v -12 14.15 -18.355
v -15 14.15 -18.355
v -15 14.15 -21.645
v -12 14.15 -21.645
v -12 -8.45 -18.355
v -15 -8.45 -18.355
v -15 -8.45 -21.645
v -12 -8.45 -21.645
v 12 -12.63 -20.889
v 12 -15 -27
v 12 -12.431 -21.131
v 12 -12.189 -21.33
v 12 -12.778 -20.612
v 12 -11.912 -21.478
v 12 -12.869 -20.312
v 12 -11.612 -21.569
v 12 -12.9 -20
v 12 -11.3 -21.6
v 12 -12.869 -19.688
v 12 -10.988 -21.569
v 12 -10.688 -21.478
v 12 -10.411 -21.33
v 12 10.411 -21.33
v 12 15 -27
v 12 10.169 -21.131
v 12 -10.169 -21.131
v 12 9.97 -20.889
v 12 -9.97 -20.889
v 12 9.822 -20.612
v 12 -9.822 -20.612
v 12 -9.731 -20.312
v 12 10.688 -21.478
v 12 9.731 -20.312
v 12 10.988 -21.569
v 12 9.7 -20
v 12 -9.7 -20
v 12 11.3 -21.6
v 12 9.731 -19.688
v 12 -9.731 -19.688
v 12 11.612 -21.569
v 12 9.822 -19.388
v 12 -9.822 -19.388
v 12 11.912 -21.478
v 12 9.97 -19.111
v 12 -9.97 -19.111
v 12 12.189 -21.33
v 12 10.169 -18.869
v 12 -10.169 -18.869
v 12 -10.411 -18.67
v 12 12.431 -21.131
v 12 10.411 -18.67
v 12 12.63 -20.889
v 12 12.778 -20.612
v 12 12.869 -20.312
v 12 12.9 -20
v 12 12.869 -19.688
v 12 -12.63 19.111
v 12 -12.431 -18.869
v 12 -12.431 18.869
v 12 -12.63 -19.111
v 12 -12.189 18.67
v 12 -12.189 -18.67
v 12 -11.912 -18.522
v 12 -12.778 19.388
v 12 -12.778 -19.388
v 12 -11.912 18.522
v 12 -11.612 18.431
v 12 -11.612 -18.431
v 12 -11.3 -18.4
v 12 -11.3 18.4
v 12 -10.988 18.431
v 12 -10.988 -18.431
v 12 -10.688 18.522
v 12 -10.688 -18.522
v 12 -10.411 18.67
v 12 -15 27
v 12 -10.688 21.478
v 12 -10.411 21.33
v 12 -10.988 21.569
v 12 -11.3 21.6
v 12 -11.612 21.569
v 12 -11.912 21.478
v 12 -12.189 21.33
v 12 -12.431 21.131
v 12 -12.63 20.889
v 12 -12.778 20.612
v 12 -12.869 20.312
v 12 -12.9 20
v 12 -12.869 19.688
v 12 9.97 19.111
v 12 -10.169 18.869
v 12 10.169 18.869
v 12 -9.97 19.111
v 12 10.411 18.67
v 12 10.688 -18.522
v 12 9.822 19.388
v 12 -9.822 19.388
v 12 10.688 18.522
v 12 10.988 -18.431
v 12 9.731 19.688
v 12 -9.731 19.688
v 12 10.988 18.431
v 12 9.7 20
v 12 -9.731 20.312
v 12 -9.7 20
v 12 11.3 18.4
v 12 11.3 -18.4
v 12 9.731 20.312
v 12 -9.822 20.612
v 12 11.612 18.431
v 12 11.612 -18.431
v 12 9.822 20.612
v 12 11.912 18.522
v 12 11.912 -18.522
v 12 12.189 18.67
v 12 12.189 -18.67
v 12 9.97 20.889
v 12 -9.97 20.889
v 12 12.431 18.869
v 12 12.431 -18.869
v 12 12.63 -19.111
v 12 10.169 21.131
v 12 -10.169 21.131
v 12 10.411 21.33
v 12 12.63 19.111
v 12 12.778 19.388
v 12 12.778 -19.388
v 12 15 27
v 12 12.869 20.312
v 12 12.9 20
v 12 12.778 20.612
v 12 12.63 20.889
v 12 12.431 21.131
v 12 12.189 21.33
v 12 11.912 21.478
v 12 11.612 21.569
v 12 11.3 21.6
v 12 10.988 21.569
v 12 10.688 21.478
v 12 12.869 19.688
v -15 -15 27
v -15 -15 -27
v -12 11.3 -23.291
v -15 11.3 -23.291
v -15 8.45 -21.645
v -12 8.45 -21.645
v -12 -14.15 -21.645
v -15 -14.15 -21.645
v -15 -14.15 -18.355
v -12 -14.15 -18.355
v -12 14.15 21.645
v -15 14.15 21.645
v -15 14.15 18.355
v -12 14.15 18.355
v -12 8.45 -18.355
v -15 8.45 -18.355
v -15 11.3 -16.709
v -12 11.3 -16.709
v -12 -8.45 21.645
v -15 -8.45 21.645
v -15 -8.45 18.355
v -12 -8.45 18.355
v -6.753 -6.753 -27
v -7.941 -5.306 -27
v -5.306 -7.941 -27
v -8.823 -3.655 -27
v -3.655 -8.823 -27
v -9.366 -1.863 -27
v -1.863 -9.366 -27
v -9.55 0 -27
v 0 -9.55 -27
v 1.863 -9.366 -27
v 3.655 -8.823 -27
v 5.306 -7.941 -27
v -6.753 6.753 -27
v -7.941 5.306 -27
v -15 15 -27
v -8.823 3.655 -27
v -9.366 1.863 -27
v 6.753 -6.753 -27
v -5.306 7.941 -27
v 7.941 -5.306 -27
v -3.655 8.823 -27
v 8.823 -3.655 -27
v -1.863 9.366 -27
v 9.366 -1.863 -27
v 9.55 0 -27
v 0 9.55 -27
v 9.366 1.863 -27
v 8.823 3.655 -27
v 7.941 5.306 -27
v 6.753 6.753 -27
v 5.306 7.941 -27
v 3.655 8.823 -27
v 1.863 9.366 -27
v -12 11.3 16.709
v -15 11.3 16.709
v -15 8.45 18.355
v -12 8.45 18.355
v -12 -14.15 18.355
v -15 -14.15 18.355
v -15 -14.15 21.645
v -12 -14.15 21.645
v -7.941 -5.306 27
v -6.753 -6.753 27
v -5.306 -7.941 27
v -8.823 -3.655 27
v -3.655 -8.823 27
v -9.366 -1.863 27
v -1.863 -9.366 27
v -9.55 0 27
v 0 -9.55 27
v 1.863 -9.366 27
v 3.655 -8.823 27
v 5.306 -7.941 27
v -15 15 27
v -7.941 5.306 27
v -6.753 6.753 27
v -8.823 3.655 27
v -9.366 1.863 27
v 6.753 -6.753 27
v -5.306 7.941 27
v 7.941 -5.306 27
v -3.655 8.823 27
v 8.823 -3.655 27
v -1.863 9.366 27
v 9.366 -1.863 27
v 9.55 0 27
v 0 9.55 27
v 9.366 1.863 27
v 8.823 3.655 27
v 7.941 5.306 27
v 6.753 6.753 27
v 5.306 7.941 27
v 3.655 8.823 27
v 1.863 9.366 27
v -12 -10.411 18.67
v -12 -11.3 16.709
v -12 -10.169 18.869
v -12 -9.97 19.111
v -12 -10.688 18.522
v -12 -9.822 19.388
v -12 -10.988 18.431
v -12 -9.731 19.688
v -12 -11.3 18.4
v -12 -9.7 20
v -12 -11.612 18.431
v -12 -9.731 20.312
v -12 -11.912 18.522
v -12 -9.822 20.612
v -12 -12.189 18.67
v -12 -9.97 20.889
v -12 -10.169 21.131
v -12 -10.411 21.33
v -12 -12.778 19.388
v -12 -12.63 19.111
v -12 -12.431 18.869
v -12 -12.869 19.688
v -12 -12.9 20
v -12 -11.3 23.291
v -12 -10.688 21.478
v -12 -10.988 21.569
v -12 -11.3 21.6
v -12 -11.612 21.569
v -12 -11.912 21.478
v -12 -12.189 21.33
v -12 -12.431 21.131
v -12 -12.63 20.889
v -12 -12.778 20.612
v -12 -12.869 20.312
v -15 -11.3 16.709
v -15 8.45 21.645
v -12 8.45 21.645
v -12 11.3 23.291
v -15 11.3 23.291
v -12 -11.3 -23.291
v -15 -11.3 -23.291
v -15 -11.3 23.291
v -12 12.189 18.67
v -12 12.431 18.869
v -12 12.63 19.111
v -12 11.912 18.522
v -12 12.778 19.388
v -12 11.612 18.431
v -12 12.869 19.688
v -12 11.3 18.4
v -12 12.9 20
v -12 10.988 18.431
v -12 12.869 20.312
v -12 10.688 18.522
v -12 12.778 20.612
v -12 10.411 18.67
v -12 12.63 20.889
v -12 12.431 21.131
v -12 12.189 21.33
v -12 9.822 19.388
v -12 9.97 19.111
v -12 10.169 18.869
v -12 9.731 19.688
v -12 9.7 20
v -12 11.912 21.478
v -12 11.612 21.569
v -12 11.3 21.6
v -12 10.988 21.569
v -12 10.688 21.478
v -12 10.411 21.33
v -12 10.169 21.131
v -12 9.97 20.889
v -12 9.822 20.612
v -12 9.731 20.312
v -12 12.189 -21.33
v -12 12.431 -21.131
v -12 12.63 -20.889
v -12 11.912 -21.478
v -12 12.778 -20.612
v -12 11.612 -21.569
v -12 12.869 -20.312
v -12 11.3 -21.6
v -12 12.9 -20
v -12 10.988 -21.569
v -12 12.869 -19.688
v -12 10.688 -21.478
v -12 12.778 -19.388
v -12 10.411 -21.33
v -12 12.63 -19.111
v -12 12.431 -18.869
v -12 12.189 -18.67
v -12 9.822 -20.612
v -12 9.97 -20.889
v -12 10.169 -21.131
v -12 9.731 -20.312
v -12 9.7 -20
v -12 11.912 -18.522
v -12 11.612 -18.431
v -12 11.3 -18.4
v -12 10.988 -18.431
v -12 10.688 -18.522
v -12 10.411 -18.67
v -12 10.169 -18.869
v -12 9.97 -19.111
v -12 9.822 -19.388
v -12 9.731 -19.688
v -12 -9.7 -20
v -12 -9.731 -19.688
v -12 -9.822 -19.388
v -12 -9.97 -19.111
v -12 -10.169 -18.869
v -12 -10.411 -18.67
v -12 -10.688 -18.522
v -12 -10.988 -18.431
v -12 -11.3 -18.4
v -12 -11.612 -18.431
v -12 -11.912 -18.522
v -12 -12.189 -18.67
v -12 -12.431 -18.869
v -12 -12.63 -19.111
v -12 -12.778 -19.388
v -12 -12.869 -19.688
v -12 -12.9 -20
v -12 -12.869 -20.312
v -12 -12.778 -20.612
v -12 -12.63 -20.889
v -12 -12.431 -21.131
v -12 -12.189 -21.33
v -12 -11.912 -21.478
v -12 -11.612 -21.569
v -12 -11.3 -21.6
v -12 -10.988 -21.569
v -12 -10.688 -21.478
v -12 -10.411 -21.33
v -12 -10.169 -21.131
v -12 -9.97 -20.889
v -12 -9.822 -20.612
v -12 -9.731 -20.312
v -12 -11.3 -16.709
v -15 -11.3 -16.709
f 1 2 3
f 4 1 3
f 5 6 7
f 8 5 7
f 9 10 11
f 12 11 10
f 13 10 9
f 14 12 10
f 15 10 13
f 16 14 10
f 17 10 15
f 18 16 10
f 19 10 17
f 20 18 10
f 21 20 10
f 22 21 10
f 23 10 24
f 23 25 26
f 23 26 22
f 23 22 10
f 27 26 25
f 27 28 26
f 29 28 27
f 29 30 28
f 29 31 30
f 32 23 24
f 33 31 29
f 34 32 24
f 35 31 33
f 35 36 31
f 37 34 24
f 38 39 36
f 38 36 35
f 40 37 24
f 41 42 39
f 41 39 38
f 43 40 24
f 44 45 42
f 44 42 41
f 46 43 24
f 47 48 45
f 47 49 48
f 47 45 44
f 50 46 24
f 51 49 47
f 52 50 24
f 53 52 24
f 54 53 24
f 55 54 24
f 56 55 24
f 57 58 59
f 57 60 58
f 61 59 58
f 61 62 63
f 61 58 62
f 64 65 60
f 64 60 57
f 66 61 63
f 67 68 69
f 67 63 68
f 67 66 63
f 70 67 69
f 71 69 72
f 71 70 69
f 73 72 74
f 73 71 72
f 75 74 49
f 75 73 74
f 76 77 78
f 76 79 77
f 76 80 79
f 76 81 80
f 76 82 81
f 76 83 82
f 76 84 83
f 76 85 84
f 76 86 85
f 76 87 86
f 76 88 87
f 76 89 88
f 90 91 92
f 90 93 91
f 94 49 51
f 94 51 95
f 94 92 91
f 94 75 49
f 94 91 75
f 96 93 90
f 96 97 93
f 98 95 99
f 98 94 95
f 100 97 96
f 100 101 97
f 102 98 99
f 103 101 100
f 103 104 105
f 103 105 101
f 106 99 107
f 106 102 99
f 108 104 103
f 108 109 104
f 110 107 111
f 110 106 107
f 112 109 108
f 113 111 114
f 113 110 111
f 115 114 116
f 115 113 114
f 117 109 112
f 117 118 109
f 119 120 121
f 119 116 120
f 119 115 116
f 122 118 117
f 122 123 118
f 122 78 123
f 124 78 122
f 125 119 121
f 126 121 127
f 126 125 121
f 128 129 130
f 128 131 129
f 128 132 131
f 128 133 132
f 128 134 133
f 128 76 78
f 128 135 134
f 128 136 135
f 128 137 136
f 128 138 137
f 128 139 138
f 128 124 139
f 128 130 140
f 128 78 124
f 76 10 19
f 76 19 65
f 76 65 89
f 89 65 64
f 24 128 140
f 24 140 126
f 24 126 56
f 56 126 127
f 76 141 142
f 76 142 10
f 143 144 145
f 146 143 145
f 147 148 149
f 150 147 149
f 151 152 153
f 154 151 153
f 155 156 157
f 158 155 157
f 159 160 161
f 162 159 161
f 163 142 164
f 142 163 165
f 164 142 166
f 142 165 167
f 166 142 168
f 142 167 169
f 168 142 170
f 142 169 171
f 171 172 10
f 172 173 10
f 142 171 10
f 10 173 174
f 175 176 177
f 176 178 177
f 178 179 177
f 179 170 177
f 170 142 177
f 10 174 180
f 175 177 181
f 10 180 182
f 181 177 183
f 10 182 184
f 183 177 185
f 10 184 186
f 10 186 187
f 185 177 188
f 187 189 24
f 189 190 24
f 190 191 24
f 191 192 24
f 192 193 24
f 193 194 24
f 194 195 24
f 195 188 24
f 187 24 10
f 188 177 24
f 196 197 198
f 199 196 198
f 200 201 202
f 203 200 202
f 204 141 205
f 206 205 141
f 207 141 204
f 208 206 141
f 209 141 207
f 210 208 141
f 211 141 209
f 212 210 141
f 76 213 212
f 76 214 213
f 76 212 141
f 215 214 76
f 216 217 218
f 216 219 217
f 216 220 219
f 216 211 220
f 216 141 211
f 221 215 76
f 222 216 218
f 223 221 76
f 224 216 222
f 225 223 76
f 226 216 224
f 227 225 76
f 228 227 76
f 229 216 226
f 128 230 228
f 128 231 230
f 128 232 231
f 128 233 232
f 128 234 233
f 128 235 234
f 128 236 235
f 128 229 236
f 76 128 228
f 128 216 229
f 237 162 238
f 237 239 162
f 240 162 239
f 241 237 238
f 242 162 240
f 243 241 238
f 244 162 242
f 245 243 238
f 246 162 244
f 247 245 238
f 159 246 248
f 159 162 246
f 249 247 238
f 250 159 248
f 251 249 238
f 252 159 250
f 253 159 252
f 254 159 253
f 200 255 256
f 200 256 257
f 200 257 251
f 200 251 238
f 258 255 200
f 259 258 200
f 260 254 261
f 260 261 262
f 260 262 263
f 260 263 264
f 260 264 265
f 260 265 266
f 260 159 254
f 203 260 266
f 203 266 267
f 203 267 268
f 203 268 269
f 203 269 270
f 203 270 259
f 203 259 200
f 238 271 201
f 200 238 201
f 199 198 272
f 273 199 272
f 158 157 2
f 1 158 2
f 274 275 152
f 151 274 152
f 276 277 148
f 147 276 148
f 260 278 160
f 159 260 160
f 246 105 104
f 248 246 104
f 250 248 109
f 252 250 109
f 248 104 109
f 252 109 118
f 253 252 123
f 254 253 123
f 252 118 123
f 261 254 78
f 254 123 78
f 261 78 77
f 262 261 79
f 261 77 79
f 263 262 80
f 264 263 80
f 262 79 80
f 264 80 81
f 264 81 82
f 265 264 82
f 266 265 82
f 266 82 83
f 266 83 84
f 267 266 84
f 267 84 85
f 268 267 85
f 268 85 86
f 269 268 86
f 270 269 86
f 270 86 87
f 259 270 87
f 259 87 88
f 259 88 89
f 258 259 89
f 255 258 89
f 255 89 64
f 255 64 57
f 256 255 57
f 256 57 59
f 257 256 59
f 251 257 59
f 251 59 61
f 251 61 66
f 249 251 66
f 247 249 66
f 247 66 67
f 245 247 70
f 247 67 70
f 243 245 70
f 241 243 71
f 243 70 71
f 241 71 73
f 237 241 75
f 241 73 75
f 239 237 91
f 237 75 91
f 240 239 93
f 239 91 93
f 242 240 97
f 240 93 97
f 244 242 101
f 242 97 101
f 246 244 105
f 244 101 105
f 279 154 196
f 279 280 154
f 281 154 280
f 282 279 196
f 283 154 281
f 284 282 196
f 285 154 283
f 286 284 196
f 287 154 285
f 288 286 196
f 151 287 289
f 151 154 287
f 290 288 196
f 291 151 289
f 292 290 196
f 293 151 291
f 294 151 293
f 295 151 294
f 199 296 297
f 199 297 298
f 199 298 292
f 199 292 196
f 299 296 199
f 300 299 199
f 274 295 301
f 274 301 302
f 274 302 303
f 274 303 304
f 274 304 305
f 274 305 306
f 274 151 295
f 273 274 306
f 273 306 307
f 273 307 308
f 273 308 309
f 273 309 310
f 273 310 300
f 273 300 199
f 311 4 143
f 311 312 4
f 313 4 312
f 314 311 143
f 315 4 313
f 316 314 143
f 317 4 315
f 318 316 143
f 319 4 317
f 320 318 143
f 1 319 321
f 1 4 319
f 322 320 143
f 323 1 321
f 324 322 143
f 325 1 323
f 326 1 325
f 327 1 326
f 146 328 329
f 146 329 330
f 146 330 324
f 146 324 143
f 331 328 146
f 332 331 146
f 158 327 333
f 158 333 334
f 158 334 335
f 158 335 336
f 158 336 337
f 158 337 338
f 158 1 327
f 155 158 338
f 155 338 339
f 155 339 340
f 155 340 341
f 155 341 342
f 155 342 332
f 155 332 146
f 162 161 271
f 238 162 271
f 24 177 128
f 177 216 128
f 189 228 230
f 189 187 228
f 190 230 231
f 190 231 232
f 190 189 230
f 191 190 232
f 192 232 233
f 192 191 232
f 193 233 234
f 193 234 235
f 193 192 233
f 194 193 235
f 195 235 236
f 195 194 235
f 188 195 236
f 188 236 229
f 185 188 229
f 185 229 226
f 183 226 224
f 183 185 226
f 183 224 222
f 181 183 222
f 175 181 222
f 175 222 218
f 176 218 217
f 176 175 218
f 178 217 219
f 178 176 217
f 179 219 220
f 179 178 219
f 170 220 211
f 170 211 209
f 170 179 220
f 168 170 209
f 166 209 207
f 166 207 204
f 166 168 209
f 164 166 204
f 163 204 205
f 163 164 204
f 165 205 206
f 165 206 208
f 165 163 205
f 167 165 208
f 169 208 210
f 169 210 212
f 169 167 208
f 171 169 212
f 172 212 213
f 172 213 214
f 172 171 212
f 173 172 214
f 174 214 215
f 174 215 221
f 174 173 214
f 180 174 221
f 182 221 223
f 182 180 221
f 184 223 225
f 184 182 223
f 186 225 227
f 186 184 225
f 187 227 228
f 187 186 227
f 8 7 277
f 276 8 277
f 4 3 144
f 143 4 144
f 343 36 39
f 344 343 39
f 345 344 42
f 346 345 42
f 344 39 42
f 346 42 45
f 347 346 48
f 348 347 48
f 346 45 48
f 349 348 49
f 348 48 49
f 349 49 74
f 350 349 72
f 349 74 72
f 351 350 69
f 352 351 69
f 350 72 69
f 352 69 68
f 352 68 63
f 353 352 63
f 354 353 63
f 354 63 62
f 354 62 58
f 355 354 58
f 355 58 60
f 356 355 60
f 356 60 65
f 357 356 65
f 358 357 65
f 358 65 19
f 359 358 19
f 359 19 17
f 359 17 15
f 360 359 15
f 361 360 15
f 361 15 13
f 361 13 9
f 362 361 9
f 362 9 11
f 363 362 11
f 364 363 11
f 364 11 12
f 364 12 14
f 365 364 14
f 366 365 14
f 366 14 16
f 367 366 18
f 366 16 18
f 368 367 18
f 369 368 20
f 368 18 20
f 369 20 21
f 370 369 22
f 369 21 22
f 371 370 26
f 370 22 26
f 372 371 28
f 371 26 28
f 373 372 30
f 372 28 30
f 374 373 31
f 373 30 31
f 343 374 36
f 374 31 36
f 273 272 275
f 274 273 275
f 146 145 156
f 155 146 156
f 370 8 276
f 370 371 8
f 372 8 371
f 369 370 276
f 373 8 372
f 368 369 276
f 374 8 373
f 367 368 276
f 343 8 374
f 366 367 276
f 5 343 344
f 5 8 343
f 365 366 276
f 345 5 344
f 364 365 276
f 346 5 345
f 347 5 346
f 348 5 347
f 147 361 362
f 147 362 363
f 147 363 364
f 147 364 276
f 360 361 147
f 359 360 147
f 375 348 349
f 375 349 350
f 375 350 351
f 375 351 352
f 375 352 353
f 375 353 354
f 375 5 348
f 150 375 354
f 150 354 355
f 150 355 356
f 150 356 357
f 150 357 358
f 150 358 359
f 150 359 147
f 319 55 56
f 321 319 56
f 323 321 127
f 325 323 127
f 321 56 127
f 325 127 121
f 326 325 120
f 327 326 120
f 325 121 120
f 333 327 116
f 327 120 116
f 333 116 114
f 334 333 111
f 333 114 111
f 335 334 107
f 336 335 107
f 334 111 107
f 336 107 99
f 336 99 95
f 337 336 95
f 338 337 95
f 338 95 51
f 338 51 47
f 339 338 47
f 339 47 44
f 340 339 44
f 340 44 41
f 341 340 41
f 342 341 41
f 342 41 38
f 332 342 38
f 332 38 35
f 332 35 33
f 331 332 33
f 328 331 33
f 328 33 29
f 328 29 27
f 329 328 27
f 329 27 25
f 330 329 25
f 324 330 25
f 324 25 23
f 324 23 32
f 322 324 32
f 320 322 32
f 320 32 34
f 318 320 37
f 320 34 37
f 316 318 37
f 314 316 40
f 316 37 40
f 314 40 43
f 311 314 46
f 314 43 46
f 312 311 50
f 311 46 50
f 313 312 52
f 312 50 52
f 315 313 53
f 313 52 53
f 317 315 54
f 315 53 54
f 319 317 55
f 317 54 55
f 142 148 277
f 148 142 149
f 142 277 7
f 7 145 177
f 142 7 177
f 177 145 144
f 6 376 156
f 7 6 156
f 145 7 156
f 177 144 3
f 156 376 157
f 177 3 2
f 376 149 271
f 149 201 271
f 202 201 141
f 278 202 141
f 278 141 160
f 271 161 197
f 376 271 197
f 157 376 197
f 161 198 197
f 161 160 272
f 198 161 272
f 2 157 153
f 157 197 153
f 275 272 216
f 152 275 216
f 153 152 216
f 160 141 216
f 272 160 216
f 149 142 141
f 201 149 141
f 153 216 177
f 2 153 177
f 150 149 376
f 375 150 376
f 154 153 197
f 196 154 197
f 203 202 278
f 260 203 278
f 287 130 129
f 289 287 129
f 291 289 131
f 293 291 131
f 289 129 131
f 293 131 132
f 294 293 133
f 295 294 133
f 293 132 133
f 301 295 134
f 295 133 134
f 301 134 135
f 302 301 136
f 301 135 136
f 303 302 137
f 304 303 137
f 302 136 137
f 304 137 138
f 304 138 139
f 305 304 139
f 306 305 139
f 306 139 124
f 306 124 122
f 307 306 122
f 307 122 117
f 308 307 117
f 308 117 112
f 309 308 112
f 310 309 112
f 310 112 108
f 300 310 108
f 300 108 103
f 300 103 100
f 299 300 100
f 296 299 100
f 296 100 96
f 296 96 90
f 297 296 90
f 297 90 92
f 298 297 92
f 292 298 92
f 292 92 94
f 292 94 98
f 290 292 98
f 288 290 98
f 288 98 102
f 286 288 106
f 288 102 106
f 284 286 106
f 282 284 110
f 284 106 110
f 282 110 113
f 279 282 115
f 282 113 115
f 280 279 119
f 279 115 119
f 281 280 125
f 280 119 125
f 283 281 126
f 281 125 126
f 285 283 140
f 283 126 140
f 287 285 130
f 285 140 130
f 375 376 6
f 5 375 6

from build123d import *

# Parameters (mm, degrees)
F0_W     = 27
F0_H     = 30
F0_R     = 9.55
F1_DEPTH = 27
F2_R     = 1.6
F3_DEPTH = 27.001
F5_DEPTH = 3


with BuildPart() as f1:
    # F0 (on Top) → F1 (new body, symmetric)
    with BuildSketch(Plane.XY):
        with Locations((-1.5, 0)):
            Rectangle(F0_W, F0_H)
        Circle(F0_R, mode=Mode.SUBTRACT)
    extrude(amount=F1_DEPTH, both=True)

    # F2 (on face) → F3 (cut, through all)
    with BuildSketch(Plane.YZ.offset(12)):
        with Locations((11.3, 20)):
            Circle(F2_R)
        with Locations((11.3, -20)):
            Circle(F2_R)
        with Locations((-11.3, 20)):
            Circle(F2_R)
        with Locations((-11.3, -20)):
            Circle(F2_R)
    extrude(amount=-F3_DEPTH, mode=Mode.SUBTRACT)

    # F4 (on face) → F5 (cut)
    with BuildSketch(Plane(origin=(-15, 0, 0), x_dir=(0, -1, 0), z_dir=(-1, 0, 0))):
        Polygon((-11.3, -16.7091034656), (-14.15, -18.3545517328), (-14.15, -21.6454482672), (-11.3, -23.2908965344), (-8.45, -21.6454482672), (-8.45, -18.3545517328), align=None)
        Polygon((-11.3, 16.7091034656), (-8.45, 18.3545517328), (-8.45, 21.6454482672), (-11.3, 23.2908965344), (-14.15, 21.6454482672), (-14.15, 18.3545517328), align=None)
        Polygon((11.3, -16.7091034656), (8.45, -18.3545517328), (8.45, -21.6454482672), (11.3, -23.2908965344), (14.15, -21.6454482672), (14.15, -18.3545517328), align=None)
        Polygon((8.45, 18.3545517328), (11.3, 16.7091034656), (14.15, 18.3545517328), (14.15, 21.6454482672), (11.3, 23.2908965344), (8.45, 21.6454482672), align=None)
    extrude(amount=-F5_DEPTH, mode=Mode.SUBTRACT)


solid = f1.part
